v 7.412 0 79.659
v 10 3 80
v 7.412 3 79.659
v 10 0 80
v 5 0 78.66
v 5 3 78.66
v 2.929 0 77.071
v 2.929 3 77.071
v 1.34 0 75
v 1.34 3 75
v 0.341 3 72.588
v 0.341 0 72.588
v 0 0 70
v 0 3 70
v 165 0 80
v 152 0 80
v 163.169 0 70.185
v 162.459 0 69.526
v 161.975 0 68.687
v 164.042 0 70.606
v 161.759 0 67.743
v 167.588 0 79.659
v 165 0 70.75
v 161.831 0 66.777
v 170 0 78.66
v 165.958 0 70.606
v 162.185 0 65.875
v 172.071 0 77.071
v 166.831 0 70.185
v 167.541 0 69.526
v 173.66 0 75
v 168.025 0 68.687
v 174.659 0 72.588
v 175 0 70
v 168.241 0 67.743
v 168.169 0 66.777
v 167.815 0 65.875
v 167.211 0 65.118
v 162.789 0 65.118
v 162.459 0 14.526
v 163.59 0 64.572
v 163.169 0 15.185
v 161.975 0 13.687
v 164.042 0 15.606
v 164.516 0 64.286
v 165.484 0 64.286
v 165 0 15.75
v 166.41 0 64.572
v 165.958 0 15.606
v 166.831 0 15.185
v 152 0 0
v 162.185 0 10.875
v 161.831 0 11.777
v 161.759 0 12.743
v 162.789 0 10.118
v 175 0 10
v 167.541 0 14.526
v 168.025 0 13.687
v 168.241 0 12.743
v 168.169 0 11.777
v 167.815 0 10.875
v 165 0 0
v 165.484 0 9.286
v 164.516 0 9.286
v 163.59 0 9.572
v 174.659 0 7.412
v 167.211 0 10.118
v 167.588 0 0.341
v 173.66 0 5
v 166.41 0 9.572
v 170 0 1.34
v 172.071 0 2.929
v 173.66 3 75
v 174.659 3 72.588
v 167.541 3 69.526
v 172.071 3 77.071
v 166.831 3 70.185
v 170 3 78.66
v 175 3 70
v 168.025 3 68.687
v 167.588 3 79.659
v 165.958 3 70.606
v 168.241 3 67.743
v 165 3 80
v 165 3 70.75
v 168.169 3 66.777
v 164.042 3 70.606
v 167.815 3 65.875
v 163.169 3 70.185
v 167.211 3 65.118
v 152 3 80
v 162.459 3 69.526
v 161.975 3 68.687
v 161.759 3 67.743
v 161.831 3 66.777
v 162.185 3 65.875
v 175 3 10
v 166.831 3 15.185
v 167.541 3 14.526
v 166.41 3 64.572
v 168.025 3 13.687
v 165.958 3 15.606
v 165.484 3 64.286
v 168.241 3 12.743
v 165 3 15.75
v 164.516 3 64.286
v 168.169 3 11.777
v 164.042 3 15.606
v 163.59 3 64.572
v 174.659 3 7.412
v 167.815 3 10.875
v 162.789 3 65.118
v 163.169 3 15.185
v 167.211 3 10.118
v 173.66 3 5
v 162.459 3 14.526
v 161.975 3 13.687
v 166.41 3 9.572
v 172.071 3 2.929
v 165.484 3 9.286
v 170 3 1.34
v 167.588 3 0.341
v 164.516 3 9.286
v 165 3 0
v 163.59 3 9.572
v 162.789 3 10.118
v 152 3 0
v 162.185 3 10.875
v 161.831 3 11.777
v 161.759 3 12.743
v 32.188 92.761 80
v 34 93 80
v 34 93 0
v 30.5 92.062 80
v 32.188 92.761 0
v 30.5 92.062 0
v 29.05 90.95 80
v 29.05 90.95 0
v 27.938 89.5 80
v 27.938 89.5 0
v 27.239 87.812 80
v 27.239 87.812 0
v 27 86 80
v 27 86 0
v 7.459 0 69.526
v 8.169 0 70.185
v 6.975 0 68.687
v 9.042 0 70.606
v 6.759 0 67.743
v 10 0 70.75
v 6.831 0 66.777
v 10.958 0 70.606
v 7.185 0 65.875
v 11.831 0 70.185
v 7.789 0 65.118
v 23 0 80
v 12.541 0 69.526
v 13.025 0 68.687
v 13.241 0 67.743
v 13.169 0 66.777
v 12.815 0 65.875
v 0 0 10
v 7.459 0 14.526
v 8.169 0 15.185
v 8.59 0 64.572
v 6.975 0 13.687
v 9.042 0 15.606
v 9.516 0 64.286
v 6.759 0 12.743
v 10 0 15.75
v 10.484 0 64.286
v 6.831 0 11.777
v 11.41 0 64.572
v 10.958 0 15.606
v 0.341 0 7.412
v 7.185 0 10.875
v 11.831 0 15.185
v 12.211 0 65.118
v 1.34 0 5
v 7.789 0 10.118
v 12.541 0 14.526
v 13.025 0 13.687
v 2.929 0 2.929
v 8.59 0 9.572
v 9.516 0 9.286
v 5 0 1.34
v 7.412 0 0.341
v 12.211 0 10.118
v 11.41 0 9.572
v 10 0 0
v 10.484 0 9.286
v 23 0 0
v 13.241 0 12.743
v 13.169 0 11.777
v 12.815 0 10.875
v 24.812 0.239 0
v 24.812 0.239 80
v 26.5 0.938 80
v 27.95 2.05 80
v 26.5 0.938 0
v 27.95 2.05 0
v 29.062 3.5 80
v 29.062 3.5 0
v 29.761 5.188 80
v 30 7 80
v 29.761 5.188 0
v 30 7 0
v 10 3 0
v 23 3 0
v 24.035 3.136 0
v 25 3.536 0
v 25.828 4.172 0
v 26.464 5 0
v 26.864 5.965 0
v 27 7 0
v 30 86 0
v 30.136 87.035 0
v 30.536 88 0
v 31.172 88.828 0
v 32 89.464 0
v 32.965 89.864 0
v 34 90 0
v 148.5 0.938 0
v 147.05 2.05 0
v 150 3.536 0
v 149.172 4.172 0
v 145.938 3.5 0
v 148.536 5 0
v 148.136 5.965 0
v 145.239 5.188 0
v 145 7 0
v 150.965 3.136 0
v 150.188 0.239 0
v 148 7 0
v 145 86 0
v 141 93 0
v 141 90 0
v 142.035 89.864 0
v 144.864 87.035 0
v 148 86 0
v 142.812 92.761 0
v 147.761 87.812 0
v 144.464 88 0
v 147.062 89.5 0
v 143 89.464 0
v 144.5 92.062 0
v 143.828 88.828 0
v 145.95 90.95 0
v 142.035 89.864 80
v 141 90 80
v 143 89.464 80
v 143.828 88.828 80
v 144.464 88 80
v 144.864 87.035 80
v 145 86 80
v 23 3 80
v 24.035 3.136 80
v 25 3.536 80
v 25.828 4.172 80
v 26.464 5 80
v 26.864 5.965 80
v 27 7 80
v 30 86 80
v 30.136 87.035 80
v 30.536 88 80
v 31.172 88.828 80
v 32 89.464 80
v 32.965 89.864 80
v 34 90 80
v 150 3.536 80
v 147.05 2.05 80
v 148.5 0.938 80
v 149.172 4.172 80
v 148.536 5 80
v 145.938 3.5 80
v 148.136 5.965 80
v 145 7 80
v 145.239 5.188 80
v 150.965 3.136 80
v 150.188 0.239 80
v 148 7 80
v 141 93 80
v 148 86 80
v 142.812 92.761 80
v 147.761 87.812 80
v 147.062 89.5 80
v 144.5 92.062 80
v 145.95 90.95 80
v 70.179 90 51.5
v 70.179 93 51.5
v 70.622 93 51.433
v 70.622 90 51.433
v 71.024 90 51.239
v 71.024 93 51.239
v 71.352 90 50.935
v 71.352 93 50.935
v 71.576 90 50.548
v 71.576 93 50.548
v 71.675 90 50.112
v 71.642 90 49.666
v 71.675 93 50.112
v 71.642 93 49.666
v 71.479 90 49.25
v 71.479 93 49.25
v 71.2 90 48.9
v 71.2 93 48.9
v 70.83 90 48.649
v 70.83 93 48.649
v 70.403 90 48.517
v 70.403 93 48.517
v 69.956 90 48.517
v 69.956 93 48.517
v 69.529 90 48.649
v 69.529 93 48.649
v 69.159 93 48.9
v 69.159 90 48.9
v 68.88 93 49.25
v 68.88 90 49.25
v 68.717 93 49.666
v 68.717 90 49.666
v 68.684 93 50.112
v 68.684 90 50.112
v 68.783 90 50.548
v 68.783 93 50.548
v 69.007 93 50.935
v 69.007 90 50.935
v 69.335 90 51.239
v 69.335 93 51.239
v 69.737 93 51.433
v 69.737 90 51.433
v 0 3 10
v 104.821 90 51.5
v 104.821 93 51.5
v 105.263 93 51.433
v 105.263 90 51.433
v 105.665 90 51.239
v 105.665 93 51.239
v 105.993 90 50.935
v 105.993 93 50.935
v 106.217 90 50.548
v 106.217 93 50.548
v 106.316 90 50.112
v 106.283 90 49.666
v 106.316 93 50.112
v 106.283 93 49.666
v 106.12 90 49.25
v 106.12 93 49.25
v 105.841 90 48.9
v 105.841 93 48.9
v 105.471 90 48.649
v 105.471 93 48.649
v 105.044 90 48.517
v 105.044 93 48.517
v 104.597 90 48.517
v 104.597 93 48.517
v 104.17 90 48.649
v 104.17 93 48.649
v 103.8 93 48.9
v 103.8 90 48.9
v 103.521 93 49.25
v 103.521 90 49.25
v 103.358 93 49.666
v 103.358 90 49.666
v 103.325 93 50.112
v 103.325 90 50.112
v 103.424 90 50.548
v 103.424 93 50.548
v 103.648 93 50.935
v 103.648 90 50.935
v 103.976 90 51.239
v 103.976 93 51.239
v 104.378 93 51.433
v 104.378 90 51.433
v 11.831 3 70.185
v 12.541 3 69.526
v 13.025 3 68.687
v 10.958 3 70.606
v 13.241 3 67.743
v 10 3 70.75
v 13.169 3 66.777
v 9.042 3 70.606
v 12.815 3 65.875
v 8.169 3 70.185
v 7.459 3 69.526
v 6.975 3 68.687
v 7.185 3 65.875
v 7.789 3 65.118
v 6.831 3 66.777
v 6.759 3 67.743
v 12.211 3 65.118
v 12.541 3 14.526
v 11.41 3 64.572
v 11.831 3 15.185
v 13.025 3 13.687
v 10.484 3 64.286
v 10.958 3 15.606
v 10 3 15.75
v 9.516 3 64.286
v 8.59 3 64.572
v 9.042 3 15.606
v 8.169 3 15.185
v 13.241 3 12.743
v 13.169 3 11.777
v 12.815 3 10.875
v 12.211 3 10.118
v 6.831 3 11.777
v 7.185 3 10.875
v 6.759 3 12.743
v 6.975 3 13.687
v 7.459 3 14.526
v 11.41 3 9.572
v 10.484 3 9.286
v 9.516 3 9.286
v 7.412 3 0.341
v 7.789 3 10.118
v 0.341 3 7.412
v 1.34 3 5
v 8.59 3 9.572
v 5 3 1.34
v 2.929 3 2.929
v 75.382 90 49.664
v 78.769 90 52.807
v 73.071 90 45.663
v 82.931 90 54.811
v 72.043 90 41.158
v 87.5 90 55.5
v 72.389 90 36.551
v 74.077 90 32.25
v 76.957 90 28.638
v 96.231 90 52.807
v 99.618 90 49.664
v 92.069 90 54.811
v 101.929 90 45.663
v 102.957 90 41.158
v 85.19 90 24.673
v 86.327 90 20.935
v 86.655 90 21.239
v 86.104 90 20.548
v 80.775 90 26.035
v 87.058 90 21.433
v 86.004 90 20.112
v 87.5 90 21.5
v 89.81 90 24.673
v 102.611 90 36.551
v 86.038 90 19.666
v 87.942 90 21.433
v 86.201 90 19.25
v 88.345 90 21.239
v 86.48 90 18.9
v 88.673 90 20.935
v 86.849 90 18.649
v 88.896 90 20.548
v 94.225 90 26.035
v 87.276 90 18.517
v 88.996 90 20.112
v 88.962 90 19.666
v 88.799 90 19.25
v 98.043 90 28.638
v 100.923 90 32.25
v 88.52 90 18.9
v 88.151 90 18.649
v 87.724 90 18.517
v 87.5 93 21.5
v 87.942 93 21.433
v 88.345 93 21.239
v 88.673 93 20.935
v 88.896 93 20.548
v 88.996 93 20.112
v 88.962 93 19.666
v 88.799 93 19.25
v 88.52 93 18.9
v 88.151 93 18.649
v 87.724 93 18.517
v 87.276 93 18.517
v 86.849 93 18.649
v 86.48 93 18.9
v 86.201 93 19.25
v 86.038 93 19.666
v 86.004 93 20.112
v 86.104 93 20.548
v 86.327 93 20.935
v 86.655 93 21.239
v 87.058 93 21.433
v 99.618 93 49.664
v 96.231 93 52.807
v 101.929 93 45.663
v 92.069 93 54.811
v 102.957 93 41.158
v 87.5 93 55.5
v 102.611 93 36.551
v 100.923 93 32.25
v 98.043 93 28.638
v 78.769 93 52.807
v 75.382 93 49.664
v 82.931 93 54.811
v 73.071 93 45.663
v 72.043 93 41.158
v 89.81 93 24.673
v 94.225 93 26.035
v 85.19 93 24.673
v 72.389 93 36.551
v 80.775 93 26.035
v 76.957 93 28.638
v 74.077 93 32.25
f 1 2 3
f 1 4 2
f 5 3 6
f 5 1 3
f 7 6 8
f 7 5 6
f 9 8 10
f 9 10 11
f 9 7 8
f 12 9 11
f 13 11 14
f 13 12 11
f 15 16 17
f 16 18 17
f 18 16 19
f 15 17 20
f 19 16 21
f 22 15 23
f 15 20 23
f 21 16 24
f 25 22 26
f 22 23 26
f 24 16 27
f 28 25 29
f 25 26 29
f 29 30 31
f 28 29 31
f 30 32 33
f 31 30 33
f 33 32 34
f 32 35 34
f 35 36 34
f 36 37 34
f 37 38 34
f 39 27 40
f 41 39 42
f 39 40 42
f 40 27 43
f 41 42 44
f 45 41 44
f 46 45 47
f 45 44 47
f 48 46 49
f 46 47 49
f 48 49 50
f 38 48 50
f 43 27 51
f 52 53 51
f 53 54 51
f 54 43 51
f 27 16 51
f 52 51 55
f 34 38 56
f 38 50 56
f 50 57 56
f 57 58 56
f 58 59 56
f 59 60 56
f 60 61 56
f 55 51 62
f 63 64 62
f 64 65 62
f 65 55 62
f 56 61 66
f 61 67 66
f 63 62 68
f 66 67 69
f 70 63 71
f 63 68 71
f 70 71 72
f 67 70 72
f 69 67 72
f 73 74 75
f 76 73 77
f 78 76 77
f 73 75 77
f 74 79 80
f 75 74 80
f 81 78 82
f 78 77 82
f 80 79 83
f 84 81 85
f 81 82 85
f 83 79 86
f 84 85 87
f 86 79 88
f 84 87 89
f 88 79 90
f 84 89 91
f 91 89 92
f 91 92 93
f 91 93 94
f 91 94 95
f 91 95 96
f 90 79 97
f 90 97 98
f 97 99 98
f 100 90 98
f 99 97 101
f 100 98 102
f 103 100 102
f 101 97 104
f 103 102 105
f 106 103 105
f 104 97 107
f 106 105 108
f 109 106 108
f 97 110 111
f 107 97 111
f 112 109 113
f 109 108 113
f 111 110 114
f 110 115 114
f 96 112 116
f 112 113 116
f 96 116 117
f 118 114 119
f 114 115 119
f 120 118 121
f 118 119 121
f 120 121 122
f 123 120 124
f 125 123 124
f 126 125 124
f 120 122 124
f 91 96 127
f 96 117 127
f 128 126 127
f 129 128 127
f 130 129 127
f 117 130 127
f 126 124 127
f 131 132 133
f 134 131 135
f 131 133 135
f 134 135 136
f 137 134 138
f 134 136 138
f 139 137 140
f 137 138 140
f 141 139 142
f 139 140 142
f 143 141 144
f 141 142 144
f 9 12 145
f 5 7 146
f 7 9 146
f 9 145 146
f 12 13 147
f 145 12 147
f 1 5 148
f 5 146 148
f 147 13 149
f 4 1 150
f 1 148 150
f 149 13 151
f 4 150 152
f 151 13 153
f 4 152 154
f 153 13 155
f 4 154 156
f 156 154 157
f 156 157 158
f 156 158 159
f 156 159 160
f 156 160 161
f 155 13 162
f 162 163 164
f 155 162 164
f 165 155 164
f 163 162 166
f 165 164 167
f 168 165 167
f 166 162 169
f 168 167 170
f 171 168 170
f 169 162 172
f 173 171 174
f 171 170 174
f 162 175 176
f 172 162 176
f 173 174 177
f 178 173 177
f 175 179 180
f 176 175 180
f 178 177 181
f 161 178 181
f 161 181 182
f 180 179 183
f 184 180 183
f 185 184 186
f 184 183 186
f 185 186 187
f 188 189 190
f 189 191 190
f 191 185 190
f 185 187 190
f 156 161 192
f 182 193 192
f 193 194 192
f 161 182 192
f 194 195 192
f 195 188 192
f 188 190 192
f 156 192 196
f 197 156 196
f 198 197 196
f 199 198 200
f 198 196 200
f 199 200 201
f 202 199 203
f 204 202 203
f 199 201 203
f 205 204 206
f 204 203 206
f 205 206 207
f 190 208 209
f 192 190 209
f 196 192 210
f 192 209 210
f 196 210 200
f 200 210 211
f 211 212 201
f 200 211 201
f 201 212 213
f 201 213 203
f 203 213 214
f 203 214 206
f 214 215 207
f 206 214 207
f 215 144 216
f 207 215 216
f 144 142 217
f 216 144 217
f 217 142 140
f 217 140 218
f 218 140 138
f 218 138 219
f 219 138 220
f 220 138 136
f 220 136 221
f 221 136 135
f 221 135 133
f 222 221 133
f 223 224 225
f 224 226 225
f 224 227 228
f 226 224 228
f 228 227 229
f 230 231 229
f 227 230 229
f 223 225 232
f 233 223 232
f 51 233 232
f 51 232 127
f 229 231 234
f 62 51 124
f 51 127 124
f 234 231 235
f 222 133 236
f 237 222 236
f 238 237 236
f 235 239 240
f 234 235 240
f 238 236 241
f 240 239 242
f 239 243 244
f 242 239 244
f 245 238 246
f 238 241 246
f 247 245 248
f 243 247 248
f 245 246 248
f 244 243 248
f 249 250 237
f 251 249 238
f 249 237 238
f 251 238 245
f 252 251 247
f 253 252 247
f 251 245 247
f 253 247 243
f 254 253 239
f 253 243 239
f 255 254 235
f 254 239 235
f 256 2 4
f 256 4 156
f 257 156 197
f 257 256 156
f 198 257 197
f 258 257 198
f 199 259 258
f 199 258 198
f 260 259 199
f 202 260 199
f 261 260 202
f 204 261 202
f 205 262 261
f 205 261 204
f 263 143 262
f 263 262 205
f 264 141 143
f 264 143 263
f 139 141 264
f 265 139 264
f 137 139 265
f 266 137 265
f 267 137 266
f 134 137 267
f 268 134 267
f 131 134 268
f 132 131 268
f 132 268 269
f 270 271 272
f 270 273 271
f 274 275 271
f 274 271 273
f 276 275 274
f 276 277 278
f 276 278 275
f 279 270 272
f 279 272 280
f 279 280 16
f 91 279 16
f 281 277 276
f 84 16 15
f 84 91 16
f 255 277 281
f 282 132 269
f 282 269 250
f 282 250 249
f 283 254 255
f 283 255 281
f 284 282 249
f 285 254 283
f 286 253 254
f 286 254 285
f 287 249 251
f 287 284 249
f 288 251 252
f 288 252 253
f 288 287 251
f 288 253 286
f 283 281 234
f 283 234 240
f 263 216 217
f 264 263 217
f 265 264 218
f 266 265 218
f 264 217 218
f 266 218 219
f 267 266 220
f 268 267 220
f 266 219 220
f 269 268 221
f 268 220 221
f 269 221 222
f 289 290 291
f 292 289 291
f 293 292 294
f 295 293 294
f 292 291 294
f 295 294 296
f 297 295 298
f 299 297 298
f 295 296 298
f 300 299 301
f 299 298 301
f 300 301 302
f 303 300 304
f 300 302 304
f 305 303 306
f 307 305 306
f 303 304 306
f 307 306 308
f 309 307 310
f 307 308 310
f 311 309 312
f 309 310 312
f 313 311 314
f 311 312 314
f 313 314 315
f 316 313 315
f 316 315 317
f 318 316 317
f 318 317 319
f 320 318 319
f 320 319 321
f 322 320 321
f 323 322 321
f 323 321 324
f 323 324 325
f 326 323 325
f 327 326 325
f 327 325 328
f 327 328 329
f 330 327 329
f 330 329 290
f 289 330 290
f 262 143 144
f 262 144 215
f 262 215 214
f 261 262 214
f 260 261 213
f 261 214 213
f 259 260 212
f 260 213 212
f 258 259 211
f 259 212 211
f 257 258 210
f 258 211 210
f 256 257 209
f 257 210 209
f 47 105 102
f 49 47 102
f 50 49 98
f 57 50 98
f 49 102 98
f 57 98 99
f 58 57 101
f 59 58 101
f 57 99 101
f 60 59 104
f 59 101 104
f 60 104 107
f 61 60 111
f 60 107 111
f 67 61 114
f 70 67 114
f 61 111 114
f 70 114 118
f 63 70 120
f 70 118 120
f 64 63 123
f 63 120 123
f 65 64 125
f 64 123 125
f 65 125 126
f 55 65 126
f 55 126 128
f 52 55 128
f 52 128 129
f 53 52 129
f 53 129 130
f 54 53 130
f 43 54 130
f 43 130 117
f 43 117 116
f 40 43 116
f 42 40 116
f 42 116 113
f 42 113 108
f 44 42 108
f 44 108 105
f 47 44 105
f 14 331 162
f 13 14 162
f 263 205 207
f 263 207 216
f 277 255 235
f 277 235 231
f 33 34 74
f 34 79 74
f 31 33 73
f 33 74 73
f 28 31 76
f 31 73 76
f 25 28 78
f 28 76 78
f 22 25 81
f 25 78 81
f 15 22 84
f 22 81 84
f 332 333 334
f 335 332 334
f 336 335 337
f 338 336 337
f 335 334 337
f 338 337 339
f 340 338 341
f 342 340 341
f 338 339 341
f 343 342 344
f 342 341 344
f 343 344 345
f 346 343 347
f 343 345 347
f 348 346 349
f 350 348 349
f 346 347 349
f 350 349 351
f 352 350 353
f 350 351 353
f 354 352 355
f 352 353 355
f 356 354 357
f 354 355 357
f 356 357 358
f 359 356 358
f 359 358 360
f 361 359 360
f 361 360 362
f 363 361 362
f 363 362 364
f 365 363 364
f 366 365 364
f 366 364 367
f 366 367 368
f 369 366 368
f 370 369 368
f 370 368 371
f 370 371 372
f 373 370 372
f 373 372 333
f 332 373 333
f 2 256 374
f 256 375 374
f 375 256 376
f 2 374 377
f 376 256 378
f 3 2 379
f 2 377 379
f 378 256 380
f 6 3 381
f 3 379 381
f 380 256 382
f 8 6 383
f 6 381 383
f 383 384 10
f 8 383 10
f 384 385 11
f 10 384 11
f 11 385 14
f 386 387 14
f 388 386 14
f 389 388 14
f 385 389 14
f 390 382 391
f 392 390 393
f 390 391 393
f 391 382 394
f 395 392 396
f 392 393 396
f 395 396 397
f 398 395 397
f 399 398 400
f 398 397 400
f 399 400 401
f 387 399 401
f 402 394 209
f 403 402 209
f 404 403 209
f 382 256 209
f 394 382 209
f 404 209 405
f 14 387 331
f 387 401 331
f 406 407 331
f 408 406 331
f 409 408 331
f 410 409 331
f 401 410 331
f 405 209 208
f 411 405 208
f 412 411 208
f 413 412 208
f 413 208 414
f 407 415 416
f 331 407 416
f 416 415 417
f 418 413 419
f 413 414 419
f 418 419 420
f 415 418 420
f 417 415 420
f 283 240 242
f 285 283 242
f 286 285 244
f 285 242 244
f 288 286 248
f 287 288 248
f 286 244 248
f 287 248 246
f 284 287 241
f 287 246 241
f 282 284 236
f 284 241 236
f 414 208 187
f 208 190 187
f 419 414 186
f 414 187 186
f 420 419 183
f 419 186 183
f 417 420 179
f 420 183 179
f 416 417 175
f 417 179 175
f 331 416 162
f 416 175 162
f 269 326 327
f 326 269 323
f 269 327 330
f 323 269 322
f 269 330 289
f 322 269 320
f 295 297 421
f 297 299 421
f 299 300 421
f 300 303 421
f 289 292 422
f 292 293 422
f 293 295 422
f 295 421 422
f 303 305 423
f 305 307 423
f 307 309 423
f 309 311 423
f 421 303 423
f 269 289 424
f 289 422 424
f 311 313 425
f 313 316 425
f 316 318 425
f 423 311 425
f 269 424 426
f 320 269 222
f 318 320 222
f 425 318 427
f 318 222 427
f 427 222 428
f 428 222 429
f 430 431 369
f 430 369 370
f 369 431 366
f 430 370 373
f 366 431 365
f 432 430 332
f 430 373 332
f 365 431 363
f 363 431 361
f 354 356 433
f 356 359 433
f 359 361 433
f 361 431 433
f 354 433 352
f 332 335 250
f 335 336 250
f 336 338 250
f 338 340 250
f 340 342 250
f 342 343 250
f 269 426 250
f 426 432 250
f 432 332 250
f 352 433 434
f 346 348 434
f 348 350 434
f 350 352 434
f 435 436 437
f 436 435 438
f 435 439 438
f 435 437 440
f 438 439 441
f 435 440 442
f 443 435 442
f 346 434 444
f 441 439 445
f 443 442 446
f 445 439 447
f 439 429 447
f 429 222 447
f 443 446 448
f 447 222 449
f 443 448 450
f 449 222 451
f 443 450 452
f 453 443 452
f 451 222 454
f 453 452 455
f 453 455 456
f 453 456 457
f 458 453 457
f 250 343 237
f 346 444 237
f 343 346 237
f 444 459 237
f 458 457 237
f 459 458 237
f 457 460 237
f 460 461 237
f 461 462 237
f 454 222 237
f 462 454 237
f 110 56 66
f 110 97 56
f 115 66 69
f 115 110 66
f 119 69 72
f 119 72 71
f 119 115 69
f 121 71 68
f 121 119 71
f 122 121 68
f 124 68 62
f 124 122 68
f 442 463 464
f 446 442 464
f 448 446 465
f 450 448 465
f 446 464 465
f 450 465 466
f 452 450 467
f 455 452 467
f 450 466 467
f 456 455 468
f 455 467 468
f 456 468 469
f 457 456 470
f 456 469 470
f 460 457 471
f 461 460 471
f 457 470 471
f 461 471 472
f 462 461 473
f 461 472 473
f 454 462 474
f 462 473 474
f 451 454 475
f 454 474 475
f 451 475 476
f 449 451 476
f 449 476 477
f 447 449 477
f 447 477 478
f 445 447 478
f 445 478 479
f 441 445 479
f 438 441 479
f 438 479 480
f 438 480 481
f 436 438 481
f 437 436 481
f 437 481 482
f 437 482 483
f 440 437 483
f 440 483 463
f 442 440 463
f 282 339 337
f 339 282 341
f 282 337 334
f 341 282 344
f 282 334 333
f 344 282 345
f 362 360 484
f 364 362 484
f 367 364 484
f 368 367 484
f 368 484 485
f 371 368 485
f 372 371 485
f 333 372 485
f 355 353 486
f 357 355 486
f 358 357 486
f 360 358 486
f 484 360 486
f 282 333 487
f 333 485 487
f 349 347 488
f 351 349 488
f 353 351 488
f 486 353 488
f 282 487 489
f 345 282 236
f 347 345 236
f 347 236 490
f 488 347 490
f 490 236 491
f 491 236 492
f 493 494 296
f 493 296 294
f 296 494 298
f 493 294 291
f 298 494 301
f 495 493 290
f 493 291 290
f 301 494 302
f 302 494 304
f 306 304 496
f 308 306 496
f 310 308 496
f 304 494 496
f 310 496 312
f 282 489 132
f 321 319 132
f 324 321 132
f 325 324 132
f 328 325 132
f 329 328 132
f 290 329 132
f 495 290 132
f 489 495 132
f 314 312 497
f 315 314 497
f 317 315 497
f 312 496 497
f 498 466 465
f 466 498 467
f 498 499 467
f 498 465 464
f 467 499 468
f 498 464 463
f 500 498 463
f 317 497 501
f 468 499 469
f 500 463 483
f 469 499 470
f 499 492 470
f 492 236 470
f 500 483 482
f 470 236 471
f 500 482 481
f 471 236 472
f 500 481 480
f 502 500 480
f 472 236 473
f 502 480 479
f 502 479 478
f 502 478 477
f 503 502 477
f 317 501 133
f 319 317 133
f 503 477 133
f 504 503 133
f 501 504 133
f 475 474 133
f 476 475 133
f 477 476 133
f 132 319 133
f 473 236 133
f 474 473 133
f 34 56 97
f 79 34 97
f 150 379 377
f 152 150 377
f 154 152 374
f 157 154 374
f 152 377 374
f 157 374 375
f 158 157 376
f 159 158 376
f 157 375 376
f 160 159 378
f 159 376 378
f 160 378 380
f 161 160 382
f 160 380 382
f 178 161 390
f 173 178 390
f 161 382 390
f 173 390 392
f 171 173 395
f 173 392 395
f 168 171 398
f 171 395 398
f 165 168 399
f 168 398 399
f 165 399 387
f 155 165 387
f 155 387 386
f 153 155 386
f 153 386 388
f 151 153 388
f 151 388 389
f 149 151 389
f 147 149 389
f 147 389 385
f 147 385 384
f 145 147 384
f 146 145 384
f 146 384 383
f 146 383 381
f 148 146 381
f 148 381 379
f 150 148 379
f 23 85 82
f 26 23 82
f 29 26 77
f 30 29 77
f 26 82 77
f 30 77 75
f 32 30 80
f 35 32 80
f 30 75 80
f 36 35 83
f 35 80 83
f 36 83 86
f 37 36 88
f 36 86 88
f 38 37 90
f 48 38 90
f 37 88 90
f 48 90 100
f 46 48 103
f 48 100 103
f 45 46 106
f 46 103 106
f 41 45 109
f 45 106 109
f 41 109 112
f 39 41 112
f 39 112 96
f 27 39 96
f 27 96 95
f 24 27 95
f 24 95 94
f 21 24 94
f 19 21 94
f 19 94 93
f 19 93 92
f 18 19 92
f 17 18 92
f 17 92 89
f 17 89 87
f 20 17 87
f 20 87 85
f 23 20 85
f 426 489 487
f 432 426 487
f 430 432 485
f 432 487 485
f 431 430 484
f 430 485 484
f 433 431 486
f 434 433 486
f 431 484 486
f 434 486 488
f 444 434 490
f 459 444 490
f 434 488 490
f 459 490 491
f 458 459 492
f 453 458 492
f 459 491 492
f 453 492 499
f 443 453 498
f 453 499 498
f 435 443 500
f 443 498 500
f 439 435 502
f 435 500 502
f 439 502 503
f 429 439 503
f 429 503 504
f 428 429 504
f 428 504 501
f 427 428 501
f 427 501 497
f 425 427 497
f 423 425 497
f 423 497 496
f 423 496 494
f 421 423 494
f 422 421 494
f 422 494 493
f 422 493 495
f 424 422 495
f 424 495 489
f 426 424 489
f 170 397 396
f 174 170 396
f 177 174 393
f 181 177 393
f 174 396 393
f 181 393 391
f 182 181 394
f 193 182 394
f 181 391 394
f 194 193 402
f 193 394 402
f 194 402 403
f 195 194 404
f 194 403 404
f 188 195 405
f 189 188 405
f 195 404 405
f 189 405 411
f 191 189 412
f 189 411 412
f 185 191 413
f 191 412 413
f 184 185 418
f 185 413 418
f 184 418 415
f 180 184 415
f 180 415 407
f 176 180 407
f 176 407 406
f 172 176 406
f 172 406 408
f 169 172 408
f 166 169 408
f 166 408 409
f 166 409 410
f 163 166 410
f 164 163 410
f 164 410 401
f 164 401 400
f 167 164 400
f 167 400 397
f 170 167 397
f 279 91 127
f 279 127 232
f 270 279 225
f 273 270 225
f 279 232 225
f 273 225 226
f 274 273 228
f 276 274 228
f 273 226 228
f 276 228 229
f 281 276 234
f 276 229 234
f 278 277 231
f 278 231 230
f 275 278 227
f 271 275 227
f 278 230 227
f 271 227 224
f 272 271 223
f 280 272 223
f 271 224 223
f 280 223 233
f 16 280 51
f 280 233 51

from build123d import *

# Parameters (mm, degrees)
TABAN_FLAN_1_DEPTH    = 80
IZIM2_R               = 1.5
KES_EKSTR_ZYON1_DEPTH = 10
IZIM3_R               = 15.5
KES_EKSTR_ZYON2_DEPTH = 10
RADYUS1_R             = 10
IZIM4_R               = 3.25
KES_EKSTR_ZYON3_DEPTH = 10


# Read off the part's stored shape, not the designer's step: Taban-Flanş1
with BuildPart() as part:
    # Taban-Flanş1 outline → Taban-Flanş1 (new body)
    with BuildSketch(Plane.XY):
        with BuildLine():
            Line((152, 0), (175, 0))
            Line((175, 0), (175, 3))
            Line((175, 3), (152, 3))
            ThreePointArc((152, 3), (149.171572875, 4.171572875), (148, 7))
            Line((148, 7), (148, 86))
            ThreePointArc((148, 86), (145.949747468, 90.949747468), (141, 93))
            Line((141, 93), (34, 93))
            ThreePointArc((34, 93), (29.050252532, 90.949747468), (27, 86))
            Line((27, 86), (27, 7))
            ThreePointArc((27, 7), (25.828427125, 4.171572875), (23, 3))
            Line((23, 3), (0, 3))
            Line((0, 3), (0, 0))
            Line((0, 0), (23, 0))
            ThreePointArc((23, 0), (27.949747468, 2.050252532), (30, 7))
            Line((30, 7), (30, 86))
            ThreePointArc((30, 86), (31.171572875, 88.828427125), (34, 90))
            Line((34, 90), (141, 90))
            ThreePointArc((141, 90), (143.828427125, 88.828427125), (145, 86))
            Line((145, 86), (145, 7))
            ThreePointArc((145, 7), (147.050252532, 2.050252532), (152, 0))
        make_face()
    extrude(amount=TABAN_FLAN_1_DEPTH)

    # Çizim2 → Kes-Ekstrüzyon1 (cut)
    with BuildSketch(Plane(origin=(0, 93, 0), x_dir=(1, 0, 0), z_dir=(0, 1, 0))):
        with Locations(Location((87.5, -20, 0), (0, 0, 270))):
            Circle(IZIM2_R)
        with Locations(Location((104.820508076, -50, 0), (0, 0, 270))):
            Circle(IZIM2_R)
        with Locations(Location((70.179491924, -50, 0), (0, 0, 270))):
            Circle(IZIM2_R)
    extrude(amount=-KES_EKSTR_ZYON1_DEPTH, mode=Mode.SUBTRACT)

    # Çizim3 → Kes-Ekstrüzyon2 (cut)
    with BuildSketch(Plane(origin=(0, 93, 0), x_dir=(1, 0, 0), z_dir=(0, 1, 0))):
        with Locations(Location((87.5, -40, 0), (0, 0, 270))):
            Circle(IZIM3_R)
    extrude(amount=-KES_EKSTR_ZYON2_DEPTH, mode=Mode.SUBTRACT)

    # Radyus1
    radyus1_edges = [part.edges().sort_by_distance(p)[0] for p in [
        (0, 1.5, 0),
        (175, 1.5, 0),
        (0, 1.5, 80),
        (175, 1.5, 80),
    ]]
    fillet(radyus1_edges, radius=RADYUS1_R)

    # Çizim4 → Kes-Ekstrüzyon3 (cut)
    with BuildSketch(Plane(origin=(0, 3, 0), x_dir=(1, 0, 0), z_dir=(0, 1, 0))):
        with Locations(Location((10, -12.5, 0), (0, 0, 270))):
            Circle(IZIM4_R)
        with Locations(Location((10, -67.5, 0), (0, 0, 270))):
            Circle(IZIM4_R)
        with Locations(Location((165, -67.5, 0), (0, 0, 270))):
            Circle(IZIM4_R)
        with Locations(Location((165, -12.5, 0), (0, 0, 270))):
            Circle(IZIM4_R)
    extrude(amount=-KES_EKSTR_ZYON3_DEPTH, mode=Mode.SUBTRACT)


solid = part.part
